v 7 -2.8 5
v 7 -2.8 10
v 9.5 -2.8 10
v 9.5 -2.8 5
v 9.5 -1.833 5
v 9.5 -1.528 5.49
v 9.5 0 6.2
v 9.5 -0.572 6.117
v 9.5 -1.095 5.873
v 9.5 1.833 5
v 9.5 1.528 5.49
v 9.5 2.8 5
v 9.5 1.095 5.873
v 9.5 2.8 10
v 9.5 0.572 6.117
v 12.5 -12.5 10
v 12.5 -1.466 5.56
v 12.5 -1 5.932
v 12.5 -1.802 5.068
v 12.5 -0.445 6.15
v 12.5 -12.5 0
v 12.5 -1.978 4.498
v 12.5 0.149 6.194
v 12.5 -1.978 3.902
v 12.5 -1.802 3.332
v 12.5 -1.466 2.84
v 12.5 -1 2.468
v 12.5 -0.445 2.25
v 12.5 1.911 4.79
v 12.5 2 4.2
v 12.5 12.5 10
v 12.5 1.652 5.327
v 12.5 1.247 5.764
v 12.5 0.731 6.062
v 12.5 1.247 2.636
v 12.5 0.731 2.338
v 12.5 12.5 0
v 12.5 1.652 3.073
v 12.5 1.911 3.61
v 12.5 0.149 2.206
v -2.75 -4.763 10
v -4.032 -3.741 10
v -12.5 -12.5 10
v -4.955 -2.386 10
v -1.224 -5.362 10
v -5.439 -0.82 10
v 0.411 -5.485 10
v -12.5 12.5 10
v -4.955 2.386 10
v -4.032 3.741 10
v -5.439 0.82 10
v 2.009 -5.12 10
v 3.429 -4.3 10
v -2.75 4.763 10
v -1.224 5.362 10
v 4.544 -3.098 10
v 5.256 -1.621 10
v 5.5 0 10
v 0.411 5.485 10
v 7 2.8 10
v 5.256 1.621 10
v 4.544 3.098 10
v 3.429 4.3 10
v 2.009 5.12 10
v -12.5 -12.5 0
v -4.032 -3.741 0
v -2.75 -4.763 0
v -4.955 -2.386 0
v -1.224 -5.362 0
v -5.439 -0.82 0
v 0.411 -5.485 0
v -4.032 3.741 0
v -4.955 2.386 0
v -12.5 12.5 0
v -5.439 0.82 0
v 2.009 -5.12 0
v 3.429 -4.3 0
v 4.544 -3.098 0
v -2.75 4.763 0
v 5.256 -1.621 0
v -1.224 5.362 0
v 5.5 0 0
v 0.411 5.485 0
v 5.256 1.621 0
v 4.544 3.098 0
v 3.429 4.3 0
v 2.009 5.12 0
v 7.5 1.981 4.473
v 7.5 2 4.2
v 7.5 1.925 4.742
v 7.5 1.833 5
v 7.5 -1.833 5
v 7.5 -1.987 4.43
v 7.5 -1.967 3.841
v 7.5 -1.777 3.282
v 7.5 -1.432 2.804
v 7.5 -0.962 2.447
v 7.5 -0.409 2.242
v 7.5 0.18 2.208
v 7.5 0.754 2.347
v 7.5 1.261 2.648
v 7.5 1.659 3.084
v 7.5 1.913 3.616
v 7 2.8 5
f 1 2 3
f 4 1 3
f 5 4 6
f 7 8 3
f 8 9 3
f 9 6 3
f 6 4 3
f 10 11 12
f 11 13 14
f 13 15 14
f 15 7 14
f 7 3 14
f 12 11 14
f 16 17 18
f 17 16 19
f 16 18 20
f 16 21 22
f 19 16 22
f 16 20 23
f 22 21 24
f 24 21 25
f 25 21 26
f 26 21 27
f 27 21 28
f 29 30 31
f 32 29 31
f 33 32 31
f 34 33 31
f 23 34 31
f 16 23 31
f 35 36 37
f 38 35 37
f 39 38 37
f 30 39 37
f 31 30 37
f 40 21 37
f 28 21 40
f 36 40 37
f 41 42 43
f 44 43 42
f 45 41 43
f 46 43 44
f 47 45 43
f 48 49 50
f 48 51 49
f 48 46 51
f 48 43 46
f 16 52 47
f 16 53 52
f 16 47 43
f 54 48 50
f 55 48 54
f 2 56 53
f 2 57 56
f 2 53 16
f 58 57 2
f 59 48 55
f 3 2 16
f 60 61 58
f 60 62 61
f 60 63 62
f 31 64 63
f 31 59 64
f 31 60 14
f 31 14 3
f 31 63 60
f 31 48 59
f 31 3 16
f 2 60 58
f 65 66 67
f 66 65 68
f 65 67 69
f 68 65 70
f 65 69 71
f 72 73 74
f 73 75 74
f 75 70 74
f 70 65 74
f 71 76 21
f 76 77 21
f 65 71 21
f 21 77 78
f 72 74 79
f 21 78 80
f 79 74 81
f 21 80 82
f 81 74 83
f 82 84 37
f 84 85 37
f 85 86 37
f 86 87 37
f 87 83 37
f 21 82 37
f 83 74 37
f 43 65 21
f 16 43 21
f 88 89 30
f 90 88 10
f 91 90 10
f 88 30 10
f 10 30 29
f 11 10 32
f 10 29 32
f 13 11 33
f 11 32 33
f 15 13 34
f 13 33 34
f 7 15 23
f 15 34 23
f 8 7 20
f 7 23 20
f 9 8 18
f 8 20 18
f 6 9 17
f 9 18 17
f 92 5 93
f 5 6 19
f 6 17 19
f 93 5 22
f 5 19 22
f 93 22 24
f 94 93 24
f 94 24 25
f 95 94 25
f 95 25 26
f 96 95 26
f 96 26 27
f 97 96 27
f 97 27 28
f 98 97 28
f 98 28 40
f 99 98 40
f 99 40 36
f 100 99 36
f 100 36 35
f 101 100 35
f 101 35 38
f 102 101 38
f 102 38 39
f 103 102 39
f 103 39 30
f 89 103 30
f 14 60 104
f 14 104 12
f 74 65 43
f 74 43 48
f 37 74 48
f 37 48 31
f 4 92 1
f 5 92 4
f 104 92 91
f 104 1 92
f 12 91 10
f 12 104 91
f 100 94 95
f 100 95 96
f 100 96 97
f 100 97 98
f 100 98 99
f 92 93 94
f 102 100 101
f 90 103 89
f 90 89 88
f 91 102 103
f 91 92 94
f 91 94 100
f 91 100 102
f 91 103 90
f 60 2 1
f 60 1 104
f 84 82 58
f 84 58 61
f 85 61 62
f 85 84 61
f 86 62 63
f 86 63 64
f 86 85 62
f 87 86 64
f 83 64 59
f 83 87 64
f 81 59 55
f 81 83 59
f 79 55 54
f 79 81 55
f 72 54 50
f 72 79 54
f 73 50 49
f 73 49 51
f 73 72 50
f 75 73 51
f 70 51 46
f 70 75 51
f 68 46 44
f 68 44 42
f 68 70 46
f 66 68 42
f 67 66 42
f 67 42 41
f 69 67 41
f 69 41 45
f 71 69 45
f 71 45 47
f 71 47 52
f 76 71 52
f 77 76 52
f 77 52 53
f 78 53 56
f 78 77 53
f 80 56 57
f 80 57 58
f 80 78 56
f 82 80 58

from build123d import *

# Parameters (mm, degrees)
SKETCH_W        = 25
SKETCH_H        = 25
SKETCH_R        = 5.5
PAD_DEPTH       = 10
SKETCH001_R     = 2
POCKET_DEPTH    = 5
SKETCH002_W     = 2.5
SKETCH002_H     = 5.6
POCKET001_DEPTH = 5


with BuildPart() as part:
    # Sketch → Pad (new body)
    with BuildSketch(Plane.XY):
        Rectangle(SKETCH_W, SKETCH_H)
        Circle(SKETCH_R, mode=Mode.SUBTRACT)
    extrude(amount=PAD_DEPTH)

    # Sketch001 (on Face1 of Pad) → Pocket (cut)
    with BuildSketch(Plane.YZ.offset(12.5)):
        with Locations((0, 4.2)):
            Circle(SKETCH001_R)
    extrude(amount=-POCKET_DEPTH, mode=Mode.SUBTRACT)

    # Sketch002 (on Face4 of Pocket) → Pocket001 (cut)
    with BuildSketch(Plane.XY.offset(10)):
        with Locations((8.25, 0)):
            Rectangle(SKETCH002_W, SKETCH002_H)
    extrude(amount=-POCKET001_DEPTH, mode=Mode.SUBTRACT)


solid = part.part
